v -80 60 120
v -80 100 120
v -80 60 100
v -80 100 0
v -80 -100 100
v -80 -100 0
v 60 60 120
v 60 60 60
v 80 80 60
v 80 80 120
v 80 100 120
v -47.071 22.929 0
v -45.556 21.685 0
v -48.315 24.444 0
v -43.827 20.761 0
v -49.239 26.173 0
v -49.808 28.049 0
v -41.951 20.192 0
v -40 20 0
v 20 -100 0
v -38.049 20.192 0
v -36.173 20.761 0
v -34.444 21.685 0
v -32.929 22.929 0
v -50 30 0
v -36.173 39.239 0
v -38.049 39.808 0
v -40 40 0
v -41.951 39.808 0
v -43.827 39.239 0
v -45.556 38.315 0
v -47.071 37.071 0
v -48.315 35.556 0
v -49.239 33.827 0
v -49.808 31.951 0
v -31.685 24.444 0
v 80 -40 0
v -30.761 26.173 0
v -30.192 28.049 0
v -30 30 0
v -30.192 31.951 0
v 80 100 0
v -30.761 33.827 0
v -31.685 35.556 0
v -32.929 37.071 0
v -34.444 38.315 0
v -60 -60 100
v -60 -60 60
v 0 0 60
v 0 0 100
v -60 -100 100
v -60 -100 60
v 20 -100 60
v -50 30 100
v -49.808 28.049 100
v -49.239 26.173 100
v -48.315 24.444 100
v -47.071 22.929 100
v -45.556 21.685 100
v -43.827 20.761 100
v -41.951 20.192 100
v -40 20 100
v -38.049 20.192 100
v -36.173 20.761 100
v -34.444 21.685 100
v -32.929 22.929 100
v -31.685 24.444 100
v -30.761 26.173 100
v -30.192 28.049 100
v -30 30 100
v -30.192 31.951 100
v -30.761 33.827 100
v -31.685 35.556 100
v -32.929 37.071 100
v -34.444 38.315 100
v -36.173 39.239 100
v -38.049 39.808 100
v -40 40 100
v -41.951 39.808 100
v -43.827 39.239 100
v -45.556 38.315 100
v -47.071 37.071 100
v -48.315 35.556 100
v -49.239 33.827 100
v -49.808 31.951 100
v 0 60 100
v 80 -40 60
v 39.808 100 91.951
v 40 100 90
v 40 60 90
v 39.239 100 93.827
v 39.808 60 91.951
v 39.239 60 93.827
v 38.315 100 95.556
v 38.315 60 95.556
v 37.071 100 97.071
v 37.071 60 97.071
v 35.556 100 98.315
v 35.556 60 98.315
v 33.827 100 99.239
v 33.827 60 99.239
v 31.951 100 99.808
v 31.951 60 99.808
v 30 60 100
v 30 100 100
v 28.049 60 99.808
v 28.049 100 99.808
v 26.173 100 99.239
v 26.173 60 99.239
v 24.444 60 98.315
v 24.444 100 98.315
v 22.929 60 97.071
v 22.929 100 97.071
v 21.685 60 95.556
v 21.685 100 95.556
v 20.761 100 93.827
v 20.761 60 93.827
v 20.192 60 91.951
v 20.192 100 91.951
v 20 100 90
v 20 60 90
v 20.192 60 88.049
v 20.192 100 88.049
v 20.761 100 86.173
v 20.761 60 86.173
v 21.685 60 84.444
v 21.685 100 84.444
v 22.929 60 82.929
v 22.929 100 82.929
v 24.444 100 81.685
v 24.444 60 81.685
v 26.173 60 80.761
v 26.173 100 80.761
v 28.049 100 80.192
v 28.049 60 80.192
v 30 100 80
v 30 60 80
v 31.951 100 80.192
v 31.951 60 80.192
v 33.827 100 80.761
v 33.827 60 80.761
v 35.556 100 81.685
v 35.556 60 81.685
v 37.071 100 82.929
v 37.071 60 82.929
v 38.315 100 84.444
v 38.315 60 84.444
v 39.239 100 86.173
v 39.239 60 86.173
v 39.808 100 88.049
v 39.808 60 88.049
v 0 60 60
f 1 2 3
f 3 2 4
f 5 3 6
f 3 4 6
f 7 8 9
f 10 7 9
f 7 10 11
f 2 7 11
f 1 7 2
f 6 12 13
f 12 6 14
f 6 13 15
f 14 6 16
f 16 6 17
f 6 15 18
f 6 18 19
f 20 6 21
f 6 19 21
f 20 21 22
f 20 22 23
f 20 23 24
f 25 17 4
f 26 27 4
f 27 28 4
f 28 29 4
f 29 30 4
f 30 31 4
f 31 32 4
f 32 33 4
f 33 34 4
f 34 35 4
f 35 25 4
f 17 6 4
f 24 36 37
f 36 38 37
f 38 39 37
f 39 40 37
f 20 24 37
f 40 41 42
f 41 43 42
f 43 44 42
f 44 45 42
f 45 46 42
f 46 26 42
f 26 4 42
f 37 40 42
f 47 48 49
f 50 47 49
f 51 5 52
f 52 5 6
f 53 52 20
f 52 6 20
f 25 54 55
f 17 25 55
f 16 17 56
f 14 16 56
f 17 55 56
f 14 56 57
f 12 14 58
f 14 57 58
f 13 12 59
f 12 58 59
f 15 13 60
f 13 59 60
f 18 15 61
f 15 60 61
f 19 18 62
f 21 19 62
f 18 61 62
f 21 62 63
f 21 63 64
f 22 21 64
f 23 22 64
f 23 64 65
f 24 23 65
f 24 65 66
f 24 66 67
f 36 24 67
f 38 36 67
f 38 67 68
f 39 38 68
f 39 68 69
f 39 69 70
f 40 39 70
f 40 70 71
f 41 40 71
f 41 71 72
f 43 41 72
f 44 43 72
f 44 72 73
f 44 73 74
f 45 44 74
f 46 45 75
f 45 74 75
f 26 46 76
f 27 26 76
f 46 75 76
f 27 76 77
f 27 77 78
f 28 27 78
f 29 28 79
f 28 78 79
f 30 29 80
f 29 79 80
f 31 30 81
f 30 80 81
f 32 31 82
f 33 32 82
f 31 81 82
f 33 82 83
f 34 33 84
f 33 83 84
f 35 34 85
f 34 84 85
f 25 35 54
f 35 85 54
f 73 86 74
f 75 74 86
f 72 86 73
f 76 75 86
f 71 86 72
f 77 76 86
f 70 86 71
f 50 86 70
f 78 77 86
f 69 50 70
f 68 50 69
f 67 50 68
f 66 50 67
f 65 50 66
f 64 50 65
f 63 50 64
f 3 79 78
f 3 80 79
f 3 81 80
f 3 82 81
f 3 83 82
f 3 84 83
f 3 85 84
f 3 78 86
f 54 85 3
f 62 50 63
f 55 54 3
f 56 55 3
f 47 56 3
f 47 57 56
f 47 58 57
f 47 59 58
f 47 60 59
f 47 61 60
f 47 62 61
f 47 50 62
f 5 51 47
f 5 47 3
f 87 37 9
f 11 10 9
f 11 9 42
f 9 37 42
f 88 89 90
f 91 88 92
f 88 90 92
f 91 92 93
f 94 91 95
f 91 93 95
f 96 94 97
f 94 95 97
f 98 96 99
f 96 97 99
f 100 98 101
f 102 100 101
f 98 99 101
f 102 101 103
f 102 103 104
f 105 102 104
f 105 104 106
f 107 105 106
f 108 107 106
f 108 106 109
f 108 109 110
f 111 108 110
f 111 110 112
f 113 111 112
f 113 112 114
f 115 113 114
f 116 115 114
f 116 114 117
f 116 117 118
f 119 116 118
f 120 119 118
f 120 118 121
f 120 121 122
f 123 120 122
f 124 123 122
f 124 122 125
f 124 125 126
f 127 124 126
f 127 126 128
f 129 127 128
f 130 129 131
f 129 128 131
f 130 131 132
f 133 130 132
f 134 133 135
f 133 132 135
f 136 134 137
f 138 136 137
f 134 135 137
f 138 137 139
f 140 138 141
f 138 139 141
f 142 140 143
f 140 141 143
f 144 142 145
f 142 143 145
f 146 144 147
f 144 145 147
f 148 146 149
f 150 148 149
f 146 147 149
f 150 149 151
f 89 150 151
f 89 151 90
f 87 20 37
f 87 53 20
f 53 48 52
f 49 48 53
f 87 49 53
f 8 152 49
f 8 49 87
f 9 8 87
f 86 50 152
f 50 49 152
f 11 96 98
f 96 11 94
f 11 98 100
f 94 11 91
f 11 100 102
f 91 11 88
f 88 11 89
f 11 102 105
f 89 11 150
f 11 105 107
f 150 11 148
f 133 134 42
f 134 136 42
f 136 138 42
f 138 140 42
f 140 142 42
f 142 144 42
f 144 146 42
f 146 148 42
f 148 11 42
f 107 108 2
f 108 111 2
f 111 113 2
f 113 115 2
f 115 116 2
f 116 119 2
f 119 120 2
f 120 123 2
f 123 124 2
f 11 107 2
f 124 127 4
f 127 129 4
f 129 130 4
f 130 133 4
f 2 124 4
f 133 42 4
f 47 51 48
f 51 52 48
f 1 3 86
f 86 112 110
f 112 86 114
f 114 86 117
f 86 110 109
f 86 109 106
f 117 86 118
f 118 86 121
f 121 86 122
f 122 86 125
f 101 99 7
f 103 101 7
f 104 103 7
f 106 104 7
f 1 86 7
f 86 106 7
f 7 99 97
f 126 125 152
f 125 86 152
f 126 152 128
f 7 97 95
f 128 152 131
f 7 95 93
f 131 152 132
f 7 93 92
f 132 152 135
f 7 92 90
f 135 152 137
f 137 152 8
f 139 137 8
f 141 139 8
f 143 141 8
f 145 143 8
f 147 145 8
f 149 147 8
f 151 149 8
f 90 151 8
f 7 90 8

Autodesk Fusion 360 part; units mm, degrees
sketch "Sketch1" plane through (0, 0, 0) normal (0, 0, 1) x (1, 0, 0) in component "Component"
  line L0 (80, -100) -> (-80, -100)
  line L1 (-80, -100) -> (-80, 100)
  line L2 (-80, 100) -> (80, 100)
  line L3 (80, 100) -> (80, -100)
  line L4 (80, -100) -> (-80, 100) construction
  line L5 (-80, -100) -> (80, 100) construction
  dimension "d1" = 160
  dimension "d2" = 200
extrude "Extrude1" add sketch "Sketch1" along normal blind 60 in component "Component"
sketch "Sketch5" plane through (0, 0, 60) normal (0, 0, 1) x (-1, 0, 0) in component "Component"
  line L0 (-80, -100) -> (80, -100)
  line L1 (80, -100) -> (80, 100)
  line L2 (80, 100) -> (-80, 100)
  line L3 (-80, 100) -> (-80, -100)
  line L4 (-20, 100) -> (-80, 40)
extrude "Extrude3" cut sketch "Sketch5" against normal up to surface (60 mm away) contours L2 L3 L4 in component "Component"
sketch "Sketch6" plane through (0, 0, 60) normal (0, 0, 1) x (-1, 0, 0) in component "Component"
  line L0 (-20, 100) -> (-80, 40)
  line L1 (-80, 40) -> (-80, -100)
  line L2 (-80, -100) -> (80, -100)
  line L3 (80, -100) -> (80, 100)
  line L4 (80, 100) -> (-20, 100)
  line L5 (60, 100) -> (60, 60)
  line L6 (60, 60) -> (0, 0)
  line L7 (0, 0) -> (0, -60)
  line L8 (0, -60) -> (80, -60)
  line L9 (80, 100) -> (60, 100)
extrude "Extrude4" add sketch "Sketch6" along normal blind 40 contours L3 L4 L5 L6 L7 L8 L9 in component "Component"
sketch "Sketch7" plane through (0, 0, 60) normal (0, 0, 1) x (-1, 0, 0) in component "Component"
  line L0 (60, 60) -> (60, 100)
  line L1 (60, 100) -> (-20, 100)
  line L2 (-20, 100) -> (-80, 40)
  line L3 (-80, 40) -> (-80, -100)
  line L4 (-80, -100) -> (80, -100)
  line L5 (80, -100) -> (80, -60)
  line L6 (80, -60) -> (0, -60)
  line L7 (0, -60) -> (0, 0)
  line L8 (0, 0) -> (60, 60)
  line L9 (-60, -60) -> (-80, -80)
  line L10 (-80, -100) -> (80, -100)
  line L11 (80, -60) -> (-60, -60)
extrude "Extrude5" add sketch "Sketch7" along normal blind 60 contours L3 L4 L5 L6 L9 L10 L11 in component "Component"
sketch "Sketch8" plane through (0, 0, 100) normal (0, 0, 1) x (-1, 0, 0) in component "Component"
  line L0 (80, 100) -> (60, 100)
  line L1 (60, 100) -> (60, 60)
  line L2 (60, 60) -> (0, 0)
  line L3 (0, 0) -> (0, -60)
  line L4 (0, -60) -> (80, -60)
  line L5 (80, -60) -> (80, 100)
  circle A0 centre (40, -30) radius 10
  dimension "d14" = 40
  dimension "d15" = 30
  dimension "d16" = 20
extrude "Extrude6" cut sketch "Sketch8" against normal up to surface (100 mm away) contours A0 in component "Component"
sketch "Sketch9" plane through (0, 60, 0) normal (0, -1, 0) x (1, 0, 0) in component "Component"
  line L0 (-80, 100) -> (0, 100)
  line L1 (0, 100) -> (0, 60)
  line L2 (0, 60) -> (60, 60)
  line L3 (60, 60) -> (60, 120)
  line L4 (60, 120) -> (-80, 120)
  line L5 (-80, 120) -> (-80, 100)
  circle A0 centre (30, 90) radius 10
  dimension "d19" = 30
  dimension "d20" = 30
  dimension "d21" = 20
extrude "Extrude7" cut sketch "Sketch9" against normal up to surface (40 mm away) contours A0 in component "Component"
component "Component" placed x (1, 0, 0) y (0, 1, 0) z (0, 0, 1) at (0, 0, 0)
